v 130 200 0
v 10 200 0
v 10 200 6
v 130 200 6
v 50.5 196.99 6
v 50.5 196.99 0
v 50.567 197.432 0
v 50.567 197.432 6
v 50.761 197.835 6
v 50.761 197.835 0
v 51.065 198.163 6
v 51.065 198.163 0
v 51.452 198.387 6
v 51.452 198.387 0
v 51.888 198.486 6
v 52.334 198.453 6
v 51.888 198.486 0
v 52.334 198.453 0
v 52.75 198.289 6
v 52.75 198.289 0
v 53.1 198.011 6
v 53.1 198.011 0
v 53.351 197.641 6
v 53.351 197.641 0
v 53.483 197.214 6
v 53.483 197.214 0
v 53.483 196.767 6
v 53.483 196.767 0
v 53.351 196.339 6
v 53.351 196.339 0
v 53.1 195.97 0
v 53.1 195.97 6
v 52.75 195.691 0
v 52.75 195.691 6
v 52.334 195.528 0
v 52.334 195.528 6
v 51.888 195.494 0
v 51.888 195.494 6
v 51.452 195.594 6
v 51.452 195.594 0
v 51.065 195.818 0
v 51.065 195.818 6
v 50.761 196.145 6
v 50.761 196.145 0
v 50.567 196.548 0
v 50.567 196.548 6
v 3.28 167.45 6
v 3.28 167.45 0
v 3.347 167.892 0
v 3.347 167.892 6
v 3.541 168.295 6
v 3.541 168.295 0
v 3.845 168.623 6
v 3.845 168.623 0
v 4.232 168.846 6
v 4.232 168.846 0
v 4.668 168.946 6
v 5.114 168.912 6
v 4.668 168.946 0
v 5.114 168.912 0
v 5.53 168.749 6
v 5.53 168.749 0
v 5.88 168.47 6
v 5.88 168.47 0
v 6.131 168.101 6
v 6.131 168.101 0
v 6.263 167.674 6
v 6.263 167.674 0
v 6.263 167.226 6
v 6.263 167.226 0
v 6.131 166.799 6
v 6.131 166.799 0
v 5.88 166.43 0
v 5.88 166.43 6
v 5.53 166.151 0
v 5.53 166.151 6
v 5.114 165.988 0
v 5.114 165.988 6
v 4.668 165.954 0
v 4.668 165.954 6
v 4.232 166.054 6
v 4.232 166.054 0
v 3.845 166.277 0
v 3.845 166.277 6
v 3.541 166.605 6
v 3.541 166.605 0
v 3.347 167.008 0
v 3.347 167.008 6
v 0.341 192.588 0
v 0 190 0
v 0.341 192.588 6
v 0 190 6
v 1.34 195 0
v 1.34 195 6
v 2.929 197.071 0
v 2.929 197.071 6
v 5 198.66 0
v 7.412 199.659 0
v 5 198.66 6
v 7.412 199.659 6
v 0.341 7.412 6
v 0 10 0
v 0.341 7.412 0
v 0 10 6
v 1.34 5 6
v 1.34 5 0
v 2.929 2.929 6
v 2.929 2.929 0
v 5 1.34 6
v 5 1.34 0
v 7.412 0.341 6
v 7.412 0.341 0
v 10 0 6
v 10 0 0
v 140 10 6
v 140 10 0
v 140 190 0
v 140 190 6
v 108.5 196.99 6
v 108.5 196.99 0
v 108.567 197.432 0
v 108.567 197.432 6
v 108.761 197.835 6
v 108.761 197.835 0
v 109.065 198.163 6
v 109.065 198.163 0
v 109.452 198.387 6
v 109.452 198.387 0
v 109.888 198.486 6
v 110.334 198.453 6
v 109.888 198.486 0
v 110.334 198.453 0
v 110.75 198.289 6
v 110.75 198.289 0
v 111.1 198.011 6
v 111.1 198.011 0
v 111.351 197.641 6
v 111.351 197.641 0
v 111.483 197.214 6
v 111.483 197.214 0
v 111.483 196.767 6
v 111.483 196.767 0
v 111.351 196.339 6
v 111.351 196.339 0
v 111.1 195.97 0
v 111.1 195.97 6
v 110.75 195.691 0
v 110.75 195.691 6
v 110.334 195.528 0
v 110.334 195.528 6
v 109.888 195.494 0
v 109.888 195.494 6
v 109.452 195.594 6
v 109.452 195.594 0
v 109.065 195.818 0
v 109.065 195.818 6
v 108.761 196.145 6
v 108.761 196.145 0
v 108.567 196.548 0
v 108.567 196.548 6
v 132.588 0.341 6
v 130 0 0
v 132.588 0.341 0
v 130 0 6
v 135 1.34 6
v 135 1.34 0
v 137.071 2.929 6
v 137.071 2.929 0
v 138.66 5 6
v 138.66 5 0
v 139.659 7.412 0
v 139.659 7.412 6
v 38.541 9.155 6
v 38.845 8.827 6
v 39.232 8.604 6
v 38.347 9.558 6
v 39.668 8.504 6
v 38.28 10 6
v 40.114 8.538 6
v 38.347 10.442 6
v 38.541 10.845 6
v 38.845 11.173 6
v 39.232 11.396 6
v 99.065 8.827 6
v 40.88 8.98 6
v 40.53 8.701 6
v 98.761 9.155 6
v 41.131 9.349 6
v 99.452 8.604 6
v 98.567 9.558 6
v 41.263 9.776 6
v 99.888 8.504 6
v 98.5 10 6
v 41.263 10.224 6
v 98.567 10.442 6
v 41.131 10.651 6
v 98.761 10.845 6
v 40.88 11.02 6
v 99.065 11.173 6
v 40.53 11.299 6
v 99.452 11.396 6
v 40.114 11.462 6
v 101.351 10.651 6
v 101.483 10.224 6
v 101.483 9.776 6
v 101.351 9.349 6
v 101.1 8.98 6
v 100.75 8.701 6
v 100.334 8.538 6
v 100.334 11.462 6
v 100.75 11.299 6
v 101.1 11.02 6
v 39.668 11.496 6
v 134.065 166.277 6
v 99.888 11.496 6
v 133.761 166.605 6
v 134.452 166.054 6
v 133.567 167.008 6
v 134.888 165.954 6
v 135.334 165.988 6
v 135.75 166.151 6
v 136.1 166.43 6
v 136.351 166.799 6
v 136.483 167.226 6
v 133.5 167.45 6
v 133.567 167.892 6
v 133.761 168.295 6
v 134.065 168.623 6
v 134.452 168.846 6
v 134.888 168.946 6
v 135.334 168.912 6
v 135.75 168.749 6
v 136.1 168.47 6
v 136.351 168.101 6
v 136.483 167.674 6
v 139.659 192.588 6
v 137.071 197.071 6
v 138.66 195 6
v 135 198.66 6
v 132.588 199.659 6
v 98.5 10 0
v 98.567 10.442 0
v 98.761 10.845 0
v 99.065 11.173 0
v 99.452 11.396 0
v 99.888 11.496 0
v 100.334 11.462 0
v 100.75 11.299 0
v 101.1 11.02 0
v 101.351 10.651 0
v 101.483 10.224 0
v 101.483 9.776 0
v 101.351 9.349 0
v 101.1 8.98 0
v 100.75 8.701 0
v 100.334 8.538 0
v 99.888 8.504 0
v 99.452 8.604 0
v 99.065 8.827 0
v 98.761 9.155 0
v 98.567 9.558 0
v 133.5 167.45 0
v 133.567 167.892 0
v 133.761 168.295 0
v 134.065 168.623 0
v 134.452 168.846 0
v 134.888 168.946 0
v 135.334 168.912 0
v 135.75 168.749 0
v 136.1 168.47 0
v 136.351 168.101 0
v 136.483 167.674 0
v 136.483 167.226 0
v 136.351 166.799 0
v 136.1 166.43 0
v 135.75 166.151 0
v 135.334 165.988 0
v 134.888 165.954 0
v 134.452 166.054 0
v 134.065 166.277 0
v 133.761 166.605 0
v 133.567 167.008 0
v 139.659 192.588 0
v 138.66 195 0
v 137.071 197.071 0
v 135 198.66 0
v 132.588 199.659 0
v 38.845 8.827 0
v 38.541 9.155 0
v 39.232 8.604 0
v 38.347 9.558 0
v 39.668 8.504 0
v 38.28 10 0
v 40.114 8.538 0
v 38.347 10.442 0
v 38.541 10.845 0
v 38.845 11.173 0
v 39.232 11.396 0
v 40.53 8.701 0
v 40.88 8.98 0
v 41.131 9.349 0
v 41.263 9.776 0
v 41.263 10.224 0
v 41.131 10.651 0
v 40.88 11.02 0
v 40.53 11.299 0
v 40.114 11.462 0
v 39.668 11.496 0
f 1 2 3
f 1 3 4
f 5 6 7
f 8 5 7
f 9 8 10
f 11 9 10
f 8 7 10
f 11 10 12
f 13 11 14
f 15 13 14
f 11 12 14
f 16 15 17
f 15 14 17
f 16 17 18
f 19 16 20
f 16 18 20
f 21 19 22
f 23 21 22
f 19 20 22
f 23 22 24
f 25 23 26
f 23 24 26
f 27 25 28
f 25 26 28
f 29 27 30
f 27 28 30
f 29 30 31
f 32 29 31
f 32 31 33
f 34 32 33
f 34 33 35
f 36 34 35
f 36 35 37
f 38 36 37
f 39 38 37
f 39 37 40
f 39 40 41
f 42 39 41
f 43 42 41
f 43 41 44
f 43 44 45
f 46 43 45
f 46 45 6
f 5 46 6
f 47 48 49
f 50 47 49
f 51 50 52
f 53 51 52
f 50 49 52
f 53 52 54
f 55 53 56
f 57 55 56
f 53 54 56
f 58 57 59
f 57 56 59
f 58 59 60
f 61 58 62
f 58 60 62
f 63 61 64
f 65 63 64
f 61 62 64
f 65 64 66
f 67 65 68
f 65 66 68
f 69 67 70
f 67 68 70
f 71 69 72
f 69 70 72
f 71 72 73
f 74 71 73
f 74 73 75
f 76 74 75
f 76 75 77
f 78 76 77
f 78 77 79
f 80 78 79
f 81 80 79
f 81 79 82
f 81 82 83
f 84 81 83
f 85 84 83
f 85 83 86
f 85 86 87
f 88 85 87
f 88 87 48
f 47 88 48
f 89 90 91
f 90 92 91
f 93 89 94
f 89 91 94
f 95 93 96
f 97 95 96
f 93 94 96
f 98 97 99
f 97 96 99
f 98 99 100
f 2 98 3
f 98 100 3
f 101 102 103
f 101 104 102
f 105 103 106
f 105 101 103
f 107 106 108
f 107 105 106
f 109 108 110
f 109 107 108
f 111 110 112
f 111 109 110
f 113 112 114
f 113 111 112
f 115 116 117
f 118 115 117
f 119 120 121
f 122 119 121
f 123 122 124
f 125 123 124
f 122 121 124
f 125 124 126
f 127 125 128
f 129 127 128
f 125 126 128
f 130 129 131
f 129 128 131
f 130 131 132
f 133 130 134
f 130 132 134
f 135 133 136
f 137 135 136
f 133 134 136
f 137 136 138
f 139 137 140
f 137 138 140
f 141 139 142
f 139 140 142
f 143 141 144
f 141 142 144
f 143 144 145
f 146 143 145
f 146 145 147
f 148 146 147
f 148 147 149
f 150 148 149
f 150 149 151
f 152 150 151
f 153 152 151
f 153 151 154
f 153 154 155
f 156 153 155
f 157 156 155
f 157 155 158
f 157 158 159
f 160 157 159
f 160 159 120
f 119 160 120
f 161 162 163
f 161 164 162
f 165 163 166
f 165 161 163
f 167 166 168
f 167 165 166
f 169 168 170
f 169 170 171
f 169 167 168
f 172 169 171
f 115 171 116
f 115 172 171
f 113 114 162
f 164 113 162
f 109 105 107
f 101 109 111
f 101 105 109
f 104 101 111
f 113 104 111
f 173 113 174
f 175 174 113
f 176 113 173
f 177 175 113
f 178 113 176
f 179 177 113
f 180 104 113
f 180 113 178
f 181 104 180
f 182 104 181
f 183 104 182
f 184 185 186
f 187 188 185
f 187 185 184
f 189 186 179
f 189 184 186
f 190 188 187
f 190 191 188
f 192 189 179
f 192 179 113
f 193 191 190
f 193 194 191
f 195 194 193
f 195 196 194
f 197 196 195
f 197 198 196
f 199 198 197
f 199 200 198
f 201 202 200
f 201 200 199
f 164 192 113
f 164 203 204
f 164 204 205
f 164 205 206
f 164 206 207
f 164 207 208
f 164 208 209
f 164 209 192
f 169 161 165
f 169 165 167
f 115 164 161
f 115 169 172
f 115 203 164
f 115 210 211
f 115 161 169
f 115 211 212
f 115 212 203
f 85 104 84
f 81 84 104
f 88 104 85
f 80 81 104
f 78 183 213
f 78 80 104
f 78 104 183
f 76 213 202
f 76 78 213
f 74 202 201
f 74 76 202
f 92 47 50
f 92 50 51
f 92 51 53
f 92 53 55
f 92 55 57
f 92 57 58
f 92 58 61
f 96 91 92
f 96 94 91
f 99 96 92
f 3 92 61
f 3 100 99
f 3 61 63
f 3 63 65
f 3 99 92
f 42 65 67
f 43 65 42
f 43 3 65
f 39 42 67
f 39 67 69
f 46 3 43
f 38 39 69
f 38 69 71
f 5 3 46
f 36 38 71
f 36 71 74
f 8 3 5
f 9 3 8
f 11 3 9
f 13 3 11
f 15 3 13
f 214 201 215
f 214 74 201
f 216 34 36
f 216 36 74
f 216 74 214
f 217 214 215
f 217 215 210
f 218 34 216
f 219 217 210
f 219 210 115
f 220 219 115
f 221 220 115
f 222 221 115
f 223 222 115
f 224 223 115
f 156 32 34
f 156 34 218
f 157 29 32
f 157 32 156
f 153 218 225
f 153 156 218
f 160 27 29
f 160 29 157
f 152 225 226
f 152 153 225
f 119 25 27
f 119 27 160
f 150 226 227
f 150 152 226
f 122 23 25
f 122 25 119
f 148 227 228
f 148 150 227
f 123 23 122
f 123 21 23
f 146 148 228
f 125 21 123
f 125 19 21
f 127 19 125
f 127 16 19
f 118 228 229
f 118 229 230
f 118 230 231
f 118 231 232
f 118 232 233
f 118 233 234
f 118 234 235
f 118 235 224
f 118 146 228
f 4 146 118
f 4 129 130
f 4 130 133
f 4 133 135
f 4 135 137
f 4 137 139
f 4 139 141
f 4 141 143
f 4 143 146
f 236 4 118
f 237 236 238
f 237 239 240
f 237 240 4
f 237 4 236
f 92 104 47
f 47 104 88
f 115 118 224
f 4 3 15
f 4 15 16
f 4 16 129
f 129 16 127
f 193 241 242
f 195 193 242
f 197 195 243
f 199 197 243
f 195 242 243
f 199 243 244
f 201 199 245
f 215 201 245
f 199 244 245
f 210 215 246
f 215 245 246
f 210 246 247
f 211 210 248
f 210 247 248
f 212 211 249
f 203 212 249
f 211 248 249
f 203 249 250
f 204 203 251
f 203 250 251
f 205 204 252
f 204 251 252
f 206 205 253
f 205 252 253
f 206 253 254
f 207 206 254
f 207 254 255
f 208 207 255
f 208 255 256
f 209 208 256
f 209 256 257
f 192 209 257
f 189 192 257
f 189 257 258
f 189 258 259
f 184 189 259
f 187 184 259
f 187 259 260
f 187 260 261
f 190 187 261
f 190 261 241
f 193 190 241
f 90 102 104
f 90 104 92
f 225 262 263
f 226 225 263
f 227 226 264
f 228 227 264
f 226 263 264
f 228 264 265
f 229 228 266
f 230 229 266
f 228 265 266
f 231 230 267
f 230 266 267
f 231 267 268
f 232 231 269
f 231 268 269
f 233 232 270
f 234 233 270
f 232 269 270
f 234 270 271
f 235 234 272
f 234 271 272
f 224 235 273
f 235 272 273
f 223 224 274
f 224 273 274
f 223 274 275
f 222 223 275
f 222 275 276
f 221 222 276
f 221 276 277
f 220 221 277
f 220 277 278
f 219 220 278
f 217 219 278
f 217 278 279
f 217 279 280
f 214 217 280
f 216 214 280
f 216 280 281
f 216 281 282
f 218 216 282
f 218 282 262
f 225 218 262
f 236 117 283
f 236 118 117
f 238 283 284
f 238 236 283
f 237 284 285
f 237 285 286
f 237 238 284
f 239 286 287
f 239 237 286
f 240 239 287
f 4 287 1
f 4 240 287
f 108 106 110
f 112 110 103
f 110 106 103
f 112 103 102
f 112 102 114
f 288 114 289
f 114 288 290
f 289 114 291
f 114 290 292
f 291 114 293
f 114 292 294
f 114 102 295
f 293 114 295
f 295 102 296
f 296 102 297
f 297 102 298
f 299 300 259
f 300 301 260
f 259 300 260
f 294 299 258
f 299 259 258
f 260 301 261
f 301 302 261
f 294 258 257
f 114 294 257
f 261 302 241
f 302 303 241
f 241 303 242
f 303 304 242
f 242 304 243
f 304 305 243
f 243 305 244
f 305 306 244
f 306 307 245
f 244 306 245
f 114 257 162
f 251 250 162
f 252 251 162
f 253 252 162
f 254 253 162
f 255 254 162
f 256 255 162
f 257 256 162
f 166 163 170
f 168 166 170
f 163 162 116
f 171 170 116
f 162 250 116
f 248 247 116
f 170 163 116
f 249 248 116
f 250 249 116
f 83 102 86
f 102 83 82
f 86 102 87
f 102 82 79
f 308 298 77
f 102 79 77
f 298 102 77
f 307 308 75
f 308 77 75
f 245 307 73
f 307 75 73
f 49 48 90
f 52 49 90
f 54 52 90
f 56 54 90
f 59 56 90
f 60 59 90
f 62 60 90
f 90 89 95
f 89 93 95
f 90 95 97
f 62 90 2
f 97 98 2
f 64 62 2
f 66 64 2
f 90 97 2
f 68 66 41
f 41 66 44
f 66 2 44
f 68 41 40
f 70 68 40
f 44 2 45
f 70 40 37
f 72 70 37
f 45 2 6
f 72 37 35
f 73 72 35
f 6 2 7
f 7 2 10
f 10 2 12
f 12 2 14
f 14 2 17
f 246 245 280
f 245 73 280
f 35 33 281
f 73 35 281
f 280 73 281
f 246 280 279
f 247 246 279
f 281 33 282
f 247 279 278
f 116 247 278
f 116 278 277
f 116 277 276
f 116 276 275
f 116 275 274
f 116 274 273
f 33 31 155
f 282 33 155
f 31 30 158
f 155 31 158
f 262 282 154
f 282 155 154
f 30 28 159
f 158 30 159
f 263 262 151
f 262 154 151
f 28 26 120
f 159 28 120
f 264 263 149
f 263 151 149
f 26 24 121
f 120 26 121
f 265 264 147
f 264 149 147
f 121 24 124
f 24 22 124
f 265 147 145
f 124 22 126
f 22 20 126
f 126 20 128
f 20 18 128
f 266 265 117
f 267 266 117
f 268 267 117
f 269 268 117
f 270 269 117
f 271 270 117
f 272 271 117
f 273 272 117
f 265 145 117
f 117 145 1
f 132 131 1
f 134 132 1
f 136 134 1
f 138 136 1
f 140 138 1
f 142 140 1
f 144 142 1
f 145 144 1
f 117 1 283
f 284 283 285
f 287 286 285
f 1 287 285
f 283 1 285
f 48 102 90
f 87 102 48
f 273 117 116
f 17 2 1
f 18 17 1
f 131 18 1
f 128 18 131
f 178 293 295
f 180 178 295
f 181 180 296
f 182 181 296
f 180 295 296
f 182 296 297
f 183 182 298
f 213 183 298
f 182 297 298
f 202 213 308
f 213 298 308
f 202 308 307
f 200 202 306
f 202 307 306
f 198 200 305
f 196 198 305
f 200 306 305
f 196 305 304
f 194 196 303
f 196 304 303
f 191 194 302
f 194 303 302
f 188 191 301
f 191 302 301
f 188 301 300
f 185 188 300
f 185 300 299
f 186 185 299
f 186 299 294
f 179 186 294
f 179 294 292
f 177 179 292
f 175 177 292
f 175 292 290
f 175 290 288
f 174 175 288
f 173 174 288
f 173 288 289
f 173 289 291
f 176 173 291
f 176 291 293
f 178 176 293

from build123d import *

# Parameters (mm, degrees)
SKETCH1_W           = 140
SKETCH1_H           = 200
BOSS_EXTRUDE1_DEPTH = 6
FILLET1_R           = 10
SKETCH2_R           = 1.5
CUT_EXTRUDE1_DEPTH  = 10
SKETCH3_R           = 1.5
CUT_EXTRUDE2_DEPTH  = 10


with BuildPart() as part:
    # Sketch1 → Boss-Extrude1 (new body)
    with BuildSketch(Plane.XY):
        with Locations((70, 100)):
            Rectangle(SKETCH1_W, SKETCH1_H)
    extrude(amount=BOSS_EXTRUDE1_DEPTH)

    # Fillet1
    fillet1_edges = [part.edges().sort_by_distance(p)[0] for p in [
        (0, 200, 3),
        (140, 200, 3),
        (140, 0, 3),
        (0, 0, 3),
    ]]
    fillet(fillet1_edges, radius=FILLET1_R)

    # Sketch2 → Cut-Extrude1 (cut)
    with BuildSketch(Plane(origin=(0, 0, 0), x_dir=(-1, 0, 0), z_dir=(0, 0, -1))):
        with Locations((-100, 10)):
            Circle(SKETCH2_R)
        with Locations((-39.78, 10)):
            Circle(SKETCH2_R)
        with Locations((-135, 167.45)):
            Circle(SKETCH2_R)
        with Locations((-4.78, 167.45)):
            Circle(SKETCH2_R)
    extrude(amount=-CUT_EXTRUDE1_DEPTH, mode=Mode.SUBTRACT)

    # Sketch3 → Cut-Extrude2 (cut)
    with BuildSketch(Plane(origin=(0, 0, 0), x_dir=(-1, 0, 0), z_dir=(0, 0, -1))):
        with Locations((-110, 196.990300429)):
            Circle(SKETCH3_R)
        with Locations((-52, 196.990300429)):
            Circle(SKETCH3_R)
    extrude(amount=-CUT_EXTRUDE2_DEPTH, mode=Mode.SUBTRACT)


solid = part.part
